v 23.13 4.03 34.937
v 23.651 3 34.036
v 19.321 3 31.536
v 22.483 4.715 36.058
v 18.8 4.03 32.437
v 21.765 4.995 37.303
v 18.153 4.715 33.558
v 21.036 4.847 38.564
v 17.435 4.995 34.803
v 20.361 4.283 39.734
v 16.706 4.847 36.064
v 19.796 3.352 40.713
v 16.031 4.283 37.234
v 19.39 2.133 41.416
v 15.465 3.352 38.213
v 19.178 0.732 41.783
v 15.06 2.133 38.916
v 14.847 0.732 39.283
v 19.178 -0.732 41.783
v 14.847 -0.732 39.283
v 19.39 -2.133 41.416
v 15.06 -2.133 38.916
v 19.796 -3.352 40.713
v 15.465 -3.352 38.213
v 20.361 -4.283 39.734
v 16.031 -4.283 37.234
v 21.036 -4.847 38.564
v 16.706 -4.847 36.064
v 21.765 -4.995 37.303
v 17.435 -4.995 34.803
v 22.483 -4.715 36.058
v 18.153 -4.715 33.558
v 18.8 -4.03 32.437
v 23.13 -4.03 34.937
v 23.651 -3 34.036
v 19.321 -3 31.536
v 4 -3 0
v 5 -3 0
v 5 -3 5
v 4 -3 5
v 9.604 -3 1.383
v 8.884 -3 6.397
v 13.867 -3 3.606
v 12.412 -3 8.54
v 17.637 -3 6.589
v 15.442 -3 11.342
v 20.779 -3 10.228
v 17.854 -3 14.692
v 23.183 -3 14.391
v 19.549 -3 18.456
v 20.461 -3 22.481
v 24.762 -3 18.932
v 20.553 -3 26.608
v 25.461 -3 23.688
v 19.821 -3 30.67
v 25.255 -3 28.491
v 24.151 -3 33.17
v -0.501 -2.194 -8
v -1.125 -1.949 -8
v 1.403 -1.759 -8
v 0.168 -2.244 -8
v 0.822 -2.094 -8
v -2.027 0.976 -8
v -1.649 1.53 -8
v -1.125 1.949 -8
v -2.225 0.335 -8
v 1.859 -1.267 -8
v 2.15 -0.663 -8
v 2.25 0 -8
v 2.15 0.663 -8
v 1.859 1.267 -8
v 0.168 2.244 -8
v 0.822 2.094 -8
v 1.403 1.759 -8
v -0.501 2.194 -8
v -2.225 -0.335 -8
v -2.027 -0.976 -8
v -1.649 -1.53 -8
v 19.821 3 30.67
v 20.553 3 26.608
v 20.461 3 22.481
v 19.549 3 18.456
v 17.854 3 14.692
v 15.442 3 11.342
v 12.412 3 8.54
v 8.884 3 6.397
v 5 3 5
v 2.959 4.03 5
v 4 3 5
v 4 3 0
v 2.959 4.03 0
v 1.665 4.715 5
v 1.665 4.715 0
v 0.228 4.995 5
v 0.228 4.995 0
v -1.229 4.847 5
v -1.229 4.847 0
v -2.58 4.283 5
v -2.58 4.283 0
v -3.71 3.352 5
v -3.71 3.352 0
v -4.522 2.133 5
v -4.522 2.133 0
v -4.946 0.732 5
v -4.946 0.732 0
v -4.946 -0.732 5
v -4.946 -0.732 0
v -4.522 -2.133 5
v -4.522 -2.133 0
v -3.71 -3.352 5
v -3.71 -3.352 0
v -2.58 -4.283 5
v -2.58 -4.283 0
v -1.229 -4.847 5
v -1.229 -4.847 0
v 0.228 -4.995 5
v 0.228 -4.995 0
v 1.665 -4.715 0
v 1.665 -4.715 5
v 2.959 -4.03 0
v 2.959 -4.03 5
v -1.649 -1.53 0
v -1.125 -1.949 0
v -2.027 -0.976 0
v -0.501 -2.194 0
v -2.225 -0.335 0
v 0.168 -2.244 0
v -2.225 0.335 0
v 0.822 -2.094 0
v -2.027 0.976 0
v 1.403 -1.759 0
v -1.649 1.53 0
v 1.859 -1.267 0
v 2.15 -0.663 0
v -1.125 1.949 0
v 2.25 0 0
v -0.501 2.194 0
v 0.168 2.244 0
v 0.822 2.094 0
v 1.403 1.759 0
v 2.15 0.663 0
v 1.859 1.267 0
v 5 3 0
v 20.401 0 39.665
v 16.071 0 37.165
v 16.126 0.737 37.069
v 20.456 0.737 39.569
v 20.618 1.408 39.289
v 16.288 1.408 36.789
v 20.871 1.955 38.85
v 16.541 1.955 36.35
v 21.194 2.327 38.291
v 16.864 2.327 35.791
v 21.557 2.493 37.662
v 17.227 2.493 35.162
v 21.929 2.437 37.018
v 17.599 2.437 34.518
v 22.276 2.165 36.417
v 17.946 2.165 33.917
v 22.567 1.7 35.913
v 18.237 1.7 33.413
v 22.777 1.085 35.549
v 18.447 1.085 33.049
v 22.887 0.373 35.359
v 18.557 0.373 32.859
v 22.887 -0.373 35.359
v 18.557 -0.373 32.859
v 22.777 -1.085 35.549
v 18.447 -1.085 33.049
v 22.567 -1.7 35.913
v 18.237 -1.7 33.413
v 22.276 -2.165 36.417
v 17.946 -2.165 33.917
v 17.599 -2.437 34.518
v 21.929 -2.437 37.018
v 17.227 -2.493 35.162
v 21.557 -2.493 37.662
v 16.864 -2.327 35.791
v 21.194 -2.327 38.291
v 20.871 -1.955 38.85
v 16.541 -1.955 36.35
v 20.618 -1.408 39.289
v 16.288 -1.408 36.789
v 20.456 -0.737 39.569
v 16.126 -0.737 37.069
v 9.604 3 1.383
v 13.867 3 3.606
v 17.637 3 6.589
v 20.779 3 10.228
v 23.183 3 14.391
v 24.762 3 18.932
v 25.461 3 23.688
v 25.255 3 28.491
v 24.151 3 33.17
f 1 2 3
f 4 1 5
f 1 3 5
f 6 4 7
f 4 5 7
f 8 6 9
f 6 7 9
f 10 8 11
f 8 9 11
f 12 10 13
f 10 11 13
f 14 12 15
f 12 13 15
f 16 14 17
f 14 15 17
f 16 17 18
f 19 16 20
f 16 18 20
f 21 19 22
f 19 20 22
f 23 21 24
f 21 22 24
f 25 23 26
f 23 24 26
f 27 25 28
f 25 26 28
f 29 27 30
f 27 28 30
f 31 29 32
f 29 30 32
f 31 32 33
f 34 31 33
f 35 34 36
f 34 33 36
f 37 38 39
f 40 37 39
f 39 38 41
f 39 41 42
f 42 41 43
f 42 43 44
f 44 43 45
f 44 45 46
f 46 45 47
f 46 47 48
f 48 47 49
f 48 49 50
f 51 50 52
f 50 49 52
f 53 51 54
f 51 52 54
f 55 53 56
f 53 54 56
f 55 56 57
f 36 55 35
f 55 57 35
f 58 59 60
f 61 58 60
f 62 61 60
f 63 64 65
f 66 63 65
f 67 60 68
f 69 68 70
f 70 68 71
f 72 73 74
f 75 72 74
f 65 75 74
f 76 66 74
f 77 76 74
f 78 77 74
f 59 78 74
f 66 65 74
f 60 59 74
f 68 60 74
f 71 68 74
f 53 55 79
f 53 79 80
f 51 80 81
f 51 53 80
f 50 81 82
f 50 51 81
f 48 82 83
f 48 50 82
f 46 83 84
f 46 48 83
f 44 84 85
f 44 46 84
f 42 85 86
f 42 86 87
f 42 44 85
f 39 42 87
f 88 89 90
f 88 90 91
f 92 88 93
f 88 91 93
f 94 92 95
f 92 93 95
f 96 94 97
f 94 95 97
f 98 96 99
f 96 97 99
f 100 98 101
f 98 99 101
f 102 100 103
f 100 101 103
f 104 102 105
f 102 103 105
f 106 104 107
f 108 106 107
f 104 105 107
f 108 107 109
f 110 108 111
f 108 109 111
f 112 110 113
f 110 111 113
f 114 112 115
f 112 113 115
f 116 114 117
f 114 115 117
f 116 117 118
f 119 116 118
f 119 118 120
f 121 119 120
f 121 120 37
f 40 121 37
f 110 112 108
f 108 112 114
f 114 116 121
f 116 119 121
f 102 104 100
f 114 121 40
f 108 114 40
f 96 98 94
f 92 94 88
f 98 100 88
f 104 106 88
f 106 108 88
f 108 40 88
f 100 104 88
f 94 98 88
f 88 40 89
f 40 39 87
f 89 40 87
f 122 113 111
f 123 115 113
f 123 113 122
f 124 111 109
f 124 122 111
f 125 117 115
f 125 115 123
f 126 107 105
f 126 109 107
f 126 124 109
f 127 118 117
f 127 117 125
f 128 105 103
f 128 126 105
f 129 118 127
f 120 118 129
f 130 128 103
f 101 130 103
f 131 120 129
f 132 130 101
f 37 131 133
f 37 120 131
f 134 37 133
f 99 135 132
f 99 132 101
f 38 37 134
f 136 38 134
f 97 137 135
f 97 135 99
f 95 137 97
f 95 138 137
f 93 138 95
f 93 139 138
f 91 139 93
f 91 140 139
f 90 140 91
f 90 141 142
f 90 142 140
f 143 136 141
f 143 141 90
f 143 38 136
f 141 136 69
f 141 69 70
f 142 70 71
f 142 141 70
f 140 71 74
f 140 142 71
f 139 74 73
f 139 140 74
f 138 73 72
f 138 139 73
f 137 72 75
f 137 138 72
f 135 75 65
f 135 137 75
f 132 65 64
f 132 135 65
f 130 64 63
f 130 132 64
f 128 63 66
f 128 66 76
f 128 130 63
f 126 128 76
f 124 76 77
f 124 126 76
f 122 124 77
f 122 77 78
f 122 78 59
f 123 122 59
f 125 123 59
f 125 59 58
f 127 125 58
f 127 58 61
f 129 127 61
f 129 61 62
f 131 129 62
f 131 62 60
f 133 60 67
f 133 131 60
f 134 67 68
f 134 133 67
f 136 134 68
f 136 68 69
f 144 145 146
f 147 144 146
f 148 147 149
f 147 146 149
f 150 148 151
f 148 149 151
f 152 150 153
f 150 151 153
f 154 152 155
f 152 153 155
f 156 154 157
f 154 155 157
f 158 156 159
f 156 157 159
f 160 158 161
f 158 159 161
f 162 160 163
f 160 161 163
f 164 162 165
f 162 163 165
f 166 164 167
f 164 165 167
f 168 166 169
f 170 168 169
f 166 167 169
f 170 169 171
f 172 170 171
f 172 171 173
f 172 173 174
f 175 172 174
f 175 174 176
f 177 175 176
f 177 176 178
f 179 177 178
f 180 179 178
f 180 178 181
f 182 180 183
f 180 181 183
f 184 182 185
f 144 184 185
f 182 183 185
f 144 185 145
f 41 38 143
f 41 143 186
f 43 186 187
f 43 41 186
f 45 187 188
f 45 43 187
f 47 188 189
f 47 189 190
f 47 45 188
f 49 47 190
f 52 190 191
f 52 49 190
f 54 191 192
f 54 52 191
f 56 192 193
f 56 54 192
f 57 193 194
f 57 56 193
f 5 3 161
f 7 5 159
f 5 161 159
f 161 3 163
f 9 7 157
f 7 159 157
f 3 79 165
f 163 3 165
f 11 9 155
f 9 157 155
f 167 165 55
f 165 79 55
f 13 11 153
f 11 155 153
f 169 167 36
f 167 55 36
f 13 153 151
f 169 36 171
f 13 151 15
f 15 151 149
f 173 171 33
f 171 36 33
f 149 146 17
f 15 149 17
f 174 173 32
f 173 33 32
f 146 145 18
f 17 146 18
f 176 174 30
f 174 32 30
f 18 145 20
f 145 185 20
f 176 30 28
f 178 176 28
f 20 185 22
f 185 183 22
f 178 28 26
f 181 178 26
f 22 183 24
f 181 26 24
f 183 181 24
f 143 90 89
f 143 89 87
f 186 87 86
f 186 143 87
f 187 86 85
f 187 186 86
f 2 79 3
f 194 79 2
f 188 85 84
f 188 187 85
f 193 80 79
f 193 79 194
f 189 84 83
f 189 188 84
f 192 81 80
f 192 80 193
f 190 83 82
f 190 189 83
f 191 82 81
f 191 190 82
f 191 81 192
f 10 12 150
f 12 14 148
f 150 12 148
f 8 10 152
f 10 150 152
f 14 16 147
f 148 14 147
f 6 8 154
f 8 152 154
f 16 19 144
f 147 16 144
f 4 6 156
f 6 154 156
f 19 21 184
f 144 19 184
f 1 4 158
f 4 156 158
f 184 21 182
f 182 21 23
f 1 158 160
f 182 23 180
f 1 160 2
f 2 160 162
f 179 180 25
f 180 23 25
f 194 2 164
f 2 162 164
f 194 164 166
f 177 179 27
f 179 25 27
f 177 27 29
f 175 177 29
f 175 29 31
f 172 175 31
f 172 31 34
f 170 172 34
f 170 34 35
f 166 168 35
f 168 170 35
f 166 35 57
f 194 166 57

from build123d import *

# Parameters (mm, degrees)
SKETCH_2_R           = 5
EXTRUDE_3_DEPTH      = 5
EXTRUDE_4_DEPTH      = 3
EXTRUDE_4_DEPTH_BACK = 3
SKETCH_4_W           = 5
SKETCH_4_H           = 6
EXTRUDE_5_DEPTH      = 3
SKETCH_5_W           = 5
SKETCH_5_H           = 6
EXTRUDE_6_DEPTH      = 3
SKETCH_6_R           = 2.5
CUT_EXTRUDE_1_DEPTH  = 5
EXTRUDE_START        = -5
SKETCH_7_R           = 2.25
EXTRUDE_7_DEPTH      = 8


with BuildPart() as part:
    # 草图2 → 凸台-拉伸3 (new body)
    with BuildSketch(Plane.XY):
        Circle(SKETCH_2_R)
    extrude(amount=EXTRUDE_3_DEPTH)



with BuildPart() as body_2:
    # 草图3 → 凸台-拉伸4 (new, two sides: drawn at the far end of the back side and taken through both)
    with BuildSketch(Plane(origin=(0, 0, 0), x_dir=(1, 0, 0), z_dir=(0, 1, 0)).offset(-EXTRUDE_4_DEPTH_BACK)):
        with BuildLine():
            ThreePointArc((5, 0), (22.079402166, -12.252451216), (24.150635095, -33.169872981))
            Line((24.150635095, -33.169872981), (19.820508076, -30.669872981))
            ThreePointArc((19.820508076, -30.669872981), (17.853571071, -14.692235936), (5, -5))
            Line((5, -5), (5, 0))
        make_face()
    extrude(amount=EXTRUDE_4_DEPTH + EXTRUDE_4_DEPTH_BACK)



with BuildPart() as body_3:
    # 草图3<3> → 旋转1 (revolve)
    with BuildSketch(Plane(origin=(0, 0, 0), x_dir=(1, 0, 0), z_dir=(0, 1, 0)), mode=Mode.PRIVATE) as revolve_1_sk:
        Polygon((24.150635095, -33.169872981), (19.820508076, -30.669872981), (17.320508076, -35), (21.650635095, -37.5), align=None)
    revolve(revolve_1_sk.sketch.rotate(Axis((0, 0, 25), (0.8660254037844406, 0, 0.4999999999999967)), 180), axis=Axis((0, 0, 25), (0.8660254037844406, 0, 0.4999999999999967)))


with BuildPart() as body_2_1:
    add(body_2.part)

    add(body_3.part)  # 凸台-拉伸5 merges body 3
    # 草图4 → 凸台-拉伸5 (add)
    with BuildSketch(Plane(origin=(-8.325317547, 0, 14.419872981), x_dir=(0.8660254037844396, 0, 0.49999999999999856), z_dir=(-0.49999999999999856, 0, 0.8660254037844396))):
        with Locations((35, 0)):
            Rectangle(SKETCH_4_W, SKETCH_4_H)
    extrude(amount=EXTRUDE_5_DEPTH)


with BuildPart() as part_1:
    add(part.part)

    add(body_2_1.part)  # 凸台-拉伸6 merges body 2
    # 草图5 → 凸台-拉伸6 (add)
    with BuildSketch(Plane.ZY.offset(-5)):
        with Locations((2.5, 0)):
            Rectangle(SKETCH_5_W, SKETCH_5_H)
    extrude(amount=EXTRUDE_6_DEPTH)

    # 草图6 → 切除-拉伸1 (cut)
    with BuildSketch(Plane(origin=(28.145825623, 0, 16.25), x_dir=(-0.49999999999999856, 0, 0.8660254037844396), z_dir=(-0.8660254037844396, 0, -0.49999999999999856))):
        with Locations((21.650635095, 0)):
            Circle(SKETCH_6_R)
    extrude(amount=-CUT_EXTRUDE_1_DEPTH, mode=Mode.SUBTRACT)

    # 草图7 → 凸台-拉伸7 (add)
    with BuildSketch(Plane.XY.offset(5).offset(EXTRUDE_START)):
        Circle(SKETCH_7_R)
    extrude(amount=-EXTRUDE_7_DEPTH)


solid = part_1.part
